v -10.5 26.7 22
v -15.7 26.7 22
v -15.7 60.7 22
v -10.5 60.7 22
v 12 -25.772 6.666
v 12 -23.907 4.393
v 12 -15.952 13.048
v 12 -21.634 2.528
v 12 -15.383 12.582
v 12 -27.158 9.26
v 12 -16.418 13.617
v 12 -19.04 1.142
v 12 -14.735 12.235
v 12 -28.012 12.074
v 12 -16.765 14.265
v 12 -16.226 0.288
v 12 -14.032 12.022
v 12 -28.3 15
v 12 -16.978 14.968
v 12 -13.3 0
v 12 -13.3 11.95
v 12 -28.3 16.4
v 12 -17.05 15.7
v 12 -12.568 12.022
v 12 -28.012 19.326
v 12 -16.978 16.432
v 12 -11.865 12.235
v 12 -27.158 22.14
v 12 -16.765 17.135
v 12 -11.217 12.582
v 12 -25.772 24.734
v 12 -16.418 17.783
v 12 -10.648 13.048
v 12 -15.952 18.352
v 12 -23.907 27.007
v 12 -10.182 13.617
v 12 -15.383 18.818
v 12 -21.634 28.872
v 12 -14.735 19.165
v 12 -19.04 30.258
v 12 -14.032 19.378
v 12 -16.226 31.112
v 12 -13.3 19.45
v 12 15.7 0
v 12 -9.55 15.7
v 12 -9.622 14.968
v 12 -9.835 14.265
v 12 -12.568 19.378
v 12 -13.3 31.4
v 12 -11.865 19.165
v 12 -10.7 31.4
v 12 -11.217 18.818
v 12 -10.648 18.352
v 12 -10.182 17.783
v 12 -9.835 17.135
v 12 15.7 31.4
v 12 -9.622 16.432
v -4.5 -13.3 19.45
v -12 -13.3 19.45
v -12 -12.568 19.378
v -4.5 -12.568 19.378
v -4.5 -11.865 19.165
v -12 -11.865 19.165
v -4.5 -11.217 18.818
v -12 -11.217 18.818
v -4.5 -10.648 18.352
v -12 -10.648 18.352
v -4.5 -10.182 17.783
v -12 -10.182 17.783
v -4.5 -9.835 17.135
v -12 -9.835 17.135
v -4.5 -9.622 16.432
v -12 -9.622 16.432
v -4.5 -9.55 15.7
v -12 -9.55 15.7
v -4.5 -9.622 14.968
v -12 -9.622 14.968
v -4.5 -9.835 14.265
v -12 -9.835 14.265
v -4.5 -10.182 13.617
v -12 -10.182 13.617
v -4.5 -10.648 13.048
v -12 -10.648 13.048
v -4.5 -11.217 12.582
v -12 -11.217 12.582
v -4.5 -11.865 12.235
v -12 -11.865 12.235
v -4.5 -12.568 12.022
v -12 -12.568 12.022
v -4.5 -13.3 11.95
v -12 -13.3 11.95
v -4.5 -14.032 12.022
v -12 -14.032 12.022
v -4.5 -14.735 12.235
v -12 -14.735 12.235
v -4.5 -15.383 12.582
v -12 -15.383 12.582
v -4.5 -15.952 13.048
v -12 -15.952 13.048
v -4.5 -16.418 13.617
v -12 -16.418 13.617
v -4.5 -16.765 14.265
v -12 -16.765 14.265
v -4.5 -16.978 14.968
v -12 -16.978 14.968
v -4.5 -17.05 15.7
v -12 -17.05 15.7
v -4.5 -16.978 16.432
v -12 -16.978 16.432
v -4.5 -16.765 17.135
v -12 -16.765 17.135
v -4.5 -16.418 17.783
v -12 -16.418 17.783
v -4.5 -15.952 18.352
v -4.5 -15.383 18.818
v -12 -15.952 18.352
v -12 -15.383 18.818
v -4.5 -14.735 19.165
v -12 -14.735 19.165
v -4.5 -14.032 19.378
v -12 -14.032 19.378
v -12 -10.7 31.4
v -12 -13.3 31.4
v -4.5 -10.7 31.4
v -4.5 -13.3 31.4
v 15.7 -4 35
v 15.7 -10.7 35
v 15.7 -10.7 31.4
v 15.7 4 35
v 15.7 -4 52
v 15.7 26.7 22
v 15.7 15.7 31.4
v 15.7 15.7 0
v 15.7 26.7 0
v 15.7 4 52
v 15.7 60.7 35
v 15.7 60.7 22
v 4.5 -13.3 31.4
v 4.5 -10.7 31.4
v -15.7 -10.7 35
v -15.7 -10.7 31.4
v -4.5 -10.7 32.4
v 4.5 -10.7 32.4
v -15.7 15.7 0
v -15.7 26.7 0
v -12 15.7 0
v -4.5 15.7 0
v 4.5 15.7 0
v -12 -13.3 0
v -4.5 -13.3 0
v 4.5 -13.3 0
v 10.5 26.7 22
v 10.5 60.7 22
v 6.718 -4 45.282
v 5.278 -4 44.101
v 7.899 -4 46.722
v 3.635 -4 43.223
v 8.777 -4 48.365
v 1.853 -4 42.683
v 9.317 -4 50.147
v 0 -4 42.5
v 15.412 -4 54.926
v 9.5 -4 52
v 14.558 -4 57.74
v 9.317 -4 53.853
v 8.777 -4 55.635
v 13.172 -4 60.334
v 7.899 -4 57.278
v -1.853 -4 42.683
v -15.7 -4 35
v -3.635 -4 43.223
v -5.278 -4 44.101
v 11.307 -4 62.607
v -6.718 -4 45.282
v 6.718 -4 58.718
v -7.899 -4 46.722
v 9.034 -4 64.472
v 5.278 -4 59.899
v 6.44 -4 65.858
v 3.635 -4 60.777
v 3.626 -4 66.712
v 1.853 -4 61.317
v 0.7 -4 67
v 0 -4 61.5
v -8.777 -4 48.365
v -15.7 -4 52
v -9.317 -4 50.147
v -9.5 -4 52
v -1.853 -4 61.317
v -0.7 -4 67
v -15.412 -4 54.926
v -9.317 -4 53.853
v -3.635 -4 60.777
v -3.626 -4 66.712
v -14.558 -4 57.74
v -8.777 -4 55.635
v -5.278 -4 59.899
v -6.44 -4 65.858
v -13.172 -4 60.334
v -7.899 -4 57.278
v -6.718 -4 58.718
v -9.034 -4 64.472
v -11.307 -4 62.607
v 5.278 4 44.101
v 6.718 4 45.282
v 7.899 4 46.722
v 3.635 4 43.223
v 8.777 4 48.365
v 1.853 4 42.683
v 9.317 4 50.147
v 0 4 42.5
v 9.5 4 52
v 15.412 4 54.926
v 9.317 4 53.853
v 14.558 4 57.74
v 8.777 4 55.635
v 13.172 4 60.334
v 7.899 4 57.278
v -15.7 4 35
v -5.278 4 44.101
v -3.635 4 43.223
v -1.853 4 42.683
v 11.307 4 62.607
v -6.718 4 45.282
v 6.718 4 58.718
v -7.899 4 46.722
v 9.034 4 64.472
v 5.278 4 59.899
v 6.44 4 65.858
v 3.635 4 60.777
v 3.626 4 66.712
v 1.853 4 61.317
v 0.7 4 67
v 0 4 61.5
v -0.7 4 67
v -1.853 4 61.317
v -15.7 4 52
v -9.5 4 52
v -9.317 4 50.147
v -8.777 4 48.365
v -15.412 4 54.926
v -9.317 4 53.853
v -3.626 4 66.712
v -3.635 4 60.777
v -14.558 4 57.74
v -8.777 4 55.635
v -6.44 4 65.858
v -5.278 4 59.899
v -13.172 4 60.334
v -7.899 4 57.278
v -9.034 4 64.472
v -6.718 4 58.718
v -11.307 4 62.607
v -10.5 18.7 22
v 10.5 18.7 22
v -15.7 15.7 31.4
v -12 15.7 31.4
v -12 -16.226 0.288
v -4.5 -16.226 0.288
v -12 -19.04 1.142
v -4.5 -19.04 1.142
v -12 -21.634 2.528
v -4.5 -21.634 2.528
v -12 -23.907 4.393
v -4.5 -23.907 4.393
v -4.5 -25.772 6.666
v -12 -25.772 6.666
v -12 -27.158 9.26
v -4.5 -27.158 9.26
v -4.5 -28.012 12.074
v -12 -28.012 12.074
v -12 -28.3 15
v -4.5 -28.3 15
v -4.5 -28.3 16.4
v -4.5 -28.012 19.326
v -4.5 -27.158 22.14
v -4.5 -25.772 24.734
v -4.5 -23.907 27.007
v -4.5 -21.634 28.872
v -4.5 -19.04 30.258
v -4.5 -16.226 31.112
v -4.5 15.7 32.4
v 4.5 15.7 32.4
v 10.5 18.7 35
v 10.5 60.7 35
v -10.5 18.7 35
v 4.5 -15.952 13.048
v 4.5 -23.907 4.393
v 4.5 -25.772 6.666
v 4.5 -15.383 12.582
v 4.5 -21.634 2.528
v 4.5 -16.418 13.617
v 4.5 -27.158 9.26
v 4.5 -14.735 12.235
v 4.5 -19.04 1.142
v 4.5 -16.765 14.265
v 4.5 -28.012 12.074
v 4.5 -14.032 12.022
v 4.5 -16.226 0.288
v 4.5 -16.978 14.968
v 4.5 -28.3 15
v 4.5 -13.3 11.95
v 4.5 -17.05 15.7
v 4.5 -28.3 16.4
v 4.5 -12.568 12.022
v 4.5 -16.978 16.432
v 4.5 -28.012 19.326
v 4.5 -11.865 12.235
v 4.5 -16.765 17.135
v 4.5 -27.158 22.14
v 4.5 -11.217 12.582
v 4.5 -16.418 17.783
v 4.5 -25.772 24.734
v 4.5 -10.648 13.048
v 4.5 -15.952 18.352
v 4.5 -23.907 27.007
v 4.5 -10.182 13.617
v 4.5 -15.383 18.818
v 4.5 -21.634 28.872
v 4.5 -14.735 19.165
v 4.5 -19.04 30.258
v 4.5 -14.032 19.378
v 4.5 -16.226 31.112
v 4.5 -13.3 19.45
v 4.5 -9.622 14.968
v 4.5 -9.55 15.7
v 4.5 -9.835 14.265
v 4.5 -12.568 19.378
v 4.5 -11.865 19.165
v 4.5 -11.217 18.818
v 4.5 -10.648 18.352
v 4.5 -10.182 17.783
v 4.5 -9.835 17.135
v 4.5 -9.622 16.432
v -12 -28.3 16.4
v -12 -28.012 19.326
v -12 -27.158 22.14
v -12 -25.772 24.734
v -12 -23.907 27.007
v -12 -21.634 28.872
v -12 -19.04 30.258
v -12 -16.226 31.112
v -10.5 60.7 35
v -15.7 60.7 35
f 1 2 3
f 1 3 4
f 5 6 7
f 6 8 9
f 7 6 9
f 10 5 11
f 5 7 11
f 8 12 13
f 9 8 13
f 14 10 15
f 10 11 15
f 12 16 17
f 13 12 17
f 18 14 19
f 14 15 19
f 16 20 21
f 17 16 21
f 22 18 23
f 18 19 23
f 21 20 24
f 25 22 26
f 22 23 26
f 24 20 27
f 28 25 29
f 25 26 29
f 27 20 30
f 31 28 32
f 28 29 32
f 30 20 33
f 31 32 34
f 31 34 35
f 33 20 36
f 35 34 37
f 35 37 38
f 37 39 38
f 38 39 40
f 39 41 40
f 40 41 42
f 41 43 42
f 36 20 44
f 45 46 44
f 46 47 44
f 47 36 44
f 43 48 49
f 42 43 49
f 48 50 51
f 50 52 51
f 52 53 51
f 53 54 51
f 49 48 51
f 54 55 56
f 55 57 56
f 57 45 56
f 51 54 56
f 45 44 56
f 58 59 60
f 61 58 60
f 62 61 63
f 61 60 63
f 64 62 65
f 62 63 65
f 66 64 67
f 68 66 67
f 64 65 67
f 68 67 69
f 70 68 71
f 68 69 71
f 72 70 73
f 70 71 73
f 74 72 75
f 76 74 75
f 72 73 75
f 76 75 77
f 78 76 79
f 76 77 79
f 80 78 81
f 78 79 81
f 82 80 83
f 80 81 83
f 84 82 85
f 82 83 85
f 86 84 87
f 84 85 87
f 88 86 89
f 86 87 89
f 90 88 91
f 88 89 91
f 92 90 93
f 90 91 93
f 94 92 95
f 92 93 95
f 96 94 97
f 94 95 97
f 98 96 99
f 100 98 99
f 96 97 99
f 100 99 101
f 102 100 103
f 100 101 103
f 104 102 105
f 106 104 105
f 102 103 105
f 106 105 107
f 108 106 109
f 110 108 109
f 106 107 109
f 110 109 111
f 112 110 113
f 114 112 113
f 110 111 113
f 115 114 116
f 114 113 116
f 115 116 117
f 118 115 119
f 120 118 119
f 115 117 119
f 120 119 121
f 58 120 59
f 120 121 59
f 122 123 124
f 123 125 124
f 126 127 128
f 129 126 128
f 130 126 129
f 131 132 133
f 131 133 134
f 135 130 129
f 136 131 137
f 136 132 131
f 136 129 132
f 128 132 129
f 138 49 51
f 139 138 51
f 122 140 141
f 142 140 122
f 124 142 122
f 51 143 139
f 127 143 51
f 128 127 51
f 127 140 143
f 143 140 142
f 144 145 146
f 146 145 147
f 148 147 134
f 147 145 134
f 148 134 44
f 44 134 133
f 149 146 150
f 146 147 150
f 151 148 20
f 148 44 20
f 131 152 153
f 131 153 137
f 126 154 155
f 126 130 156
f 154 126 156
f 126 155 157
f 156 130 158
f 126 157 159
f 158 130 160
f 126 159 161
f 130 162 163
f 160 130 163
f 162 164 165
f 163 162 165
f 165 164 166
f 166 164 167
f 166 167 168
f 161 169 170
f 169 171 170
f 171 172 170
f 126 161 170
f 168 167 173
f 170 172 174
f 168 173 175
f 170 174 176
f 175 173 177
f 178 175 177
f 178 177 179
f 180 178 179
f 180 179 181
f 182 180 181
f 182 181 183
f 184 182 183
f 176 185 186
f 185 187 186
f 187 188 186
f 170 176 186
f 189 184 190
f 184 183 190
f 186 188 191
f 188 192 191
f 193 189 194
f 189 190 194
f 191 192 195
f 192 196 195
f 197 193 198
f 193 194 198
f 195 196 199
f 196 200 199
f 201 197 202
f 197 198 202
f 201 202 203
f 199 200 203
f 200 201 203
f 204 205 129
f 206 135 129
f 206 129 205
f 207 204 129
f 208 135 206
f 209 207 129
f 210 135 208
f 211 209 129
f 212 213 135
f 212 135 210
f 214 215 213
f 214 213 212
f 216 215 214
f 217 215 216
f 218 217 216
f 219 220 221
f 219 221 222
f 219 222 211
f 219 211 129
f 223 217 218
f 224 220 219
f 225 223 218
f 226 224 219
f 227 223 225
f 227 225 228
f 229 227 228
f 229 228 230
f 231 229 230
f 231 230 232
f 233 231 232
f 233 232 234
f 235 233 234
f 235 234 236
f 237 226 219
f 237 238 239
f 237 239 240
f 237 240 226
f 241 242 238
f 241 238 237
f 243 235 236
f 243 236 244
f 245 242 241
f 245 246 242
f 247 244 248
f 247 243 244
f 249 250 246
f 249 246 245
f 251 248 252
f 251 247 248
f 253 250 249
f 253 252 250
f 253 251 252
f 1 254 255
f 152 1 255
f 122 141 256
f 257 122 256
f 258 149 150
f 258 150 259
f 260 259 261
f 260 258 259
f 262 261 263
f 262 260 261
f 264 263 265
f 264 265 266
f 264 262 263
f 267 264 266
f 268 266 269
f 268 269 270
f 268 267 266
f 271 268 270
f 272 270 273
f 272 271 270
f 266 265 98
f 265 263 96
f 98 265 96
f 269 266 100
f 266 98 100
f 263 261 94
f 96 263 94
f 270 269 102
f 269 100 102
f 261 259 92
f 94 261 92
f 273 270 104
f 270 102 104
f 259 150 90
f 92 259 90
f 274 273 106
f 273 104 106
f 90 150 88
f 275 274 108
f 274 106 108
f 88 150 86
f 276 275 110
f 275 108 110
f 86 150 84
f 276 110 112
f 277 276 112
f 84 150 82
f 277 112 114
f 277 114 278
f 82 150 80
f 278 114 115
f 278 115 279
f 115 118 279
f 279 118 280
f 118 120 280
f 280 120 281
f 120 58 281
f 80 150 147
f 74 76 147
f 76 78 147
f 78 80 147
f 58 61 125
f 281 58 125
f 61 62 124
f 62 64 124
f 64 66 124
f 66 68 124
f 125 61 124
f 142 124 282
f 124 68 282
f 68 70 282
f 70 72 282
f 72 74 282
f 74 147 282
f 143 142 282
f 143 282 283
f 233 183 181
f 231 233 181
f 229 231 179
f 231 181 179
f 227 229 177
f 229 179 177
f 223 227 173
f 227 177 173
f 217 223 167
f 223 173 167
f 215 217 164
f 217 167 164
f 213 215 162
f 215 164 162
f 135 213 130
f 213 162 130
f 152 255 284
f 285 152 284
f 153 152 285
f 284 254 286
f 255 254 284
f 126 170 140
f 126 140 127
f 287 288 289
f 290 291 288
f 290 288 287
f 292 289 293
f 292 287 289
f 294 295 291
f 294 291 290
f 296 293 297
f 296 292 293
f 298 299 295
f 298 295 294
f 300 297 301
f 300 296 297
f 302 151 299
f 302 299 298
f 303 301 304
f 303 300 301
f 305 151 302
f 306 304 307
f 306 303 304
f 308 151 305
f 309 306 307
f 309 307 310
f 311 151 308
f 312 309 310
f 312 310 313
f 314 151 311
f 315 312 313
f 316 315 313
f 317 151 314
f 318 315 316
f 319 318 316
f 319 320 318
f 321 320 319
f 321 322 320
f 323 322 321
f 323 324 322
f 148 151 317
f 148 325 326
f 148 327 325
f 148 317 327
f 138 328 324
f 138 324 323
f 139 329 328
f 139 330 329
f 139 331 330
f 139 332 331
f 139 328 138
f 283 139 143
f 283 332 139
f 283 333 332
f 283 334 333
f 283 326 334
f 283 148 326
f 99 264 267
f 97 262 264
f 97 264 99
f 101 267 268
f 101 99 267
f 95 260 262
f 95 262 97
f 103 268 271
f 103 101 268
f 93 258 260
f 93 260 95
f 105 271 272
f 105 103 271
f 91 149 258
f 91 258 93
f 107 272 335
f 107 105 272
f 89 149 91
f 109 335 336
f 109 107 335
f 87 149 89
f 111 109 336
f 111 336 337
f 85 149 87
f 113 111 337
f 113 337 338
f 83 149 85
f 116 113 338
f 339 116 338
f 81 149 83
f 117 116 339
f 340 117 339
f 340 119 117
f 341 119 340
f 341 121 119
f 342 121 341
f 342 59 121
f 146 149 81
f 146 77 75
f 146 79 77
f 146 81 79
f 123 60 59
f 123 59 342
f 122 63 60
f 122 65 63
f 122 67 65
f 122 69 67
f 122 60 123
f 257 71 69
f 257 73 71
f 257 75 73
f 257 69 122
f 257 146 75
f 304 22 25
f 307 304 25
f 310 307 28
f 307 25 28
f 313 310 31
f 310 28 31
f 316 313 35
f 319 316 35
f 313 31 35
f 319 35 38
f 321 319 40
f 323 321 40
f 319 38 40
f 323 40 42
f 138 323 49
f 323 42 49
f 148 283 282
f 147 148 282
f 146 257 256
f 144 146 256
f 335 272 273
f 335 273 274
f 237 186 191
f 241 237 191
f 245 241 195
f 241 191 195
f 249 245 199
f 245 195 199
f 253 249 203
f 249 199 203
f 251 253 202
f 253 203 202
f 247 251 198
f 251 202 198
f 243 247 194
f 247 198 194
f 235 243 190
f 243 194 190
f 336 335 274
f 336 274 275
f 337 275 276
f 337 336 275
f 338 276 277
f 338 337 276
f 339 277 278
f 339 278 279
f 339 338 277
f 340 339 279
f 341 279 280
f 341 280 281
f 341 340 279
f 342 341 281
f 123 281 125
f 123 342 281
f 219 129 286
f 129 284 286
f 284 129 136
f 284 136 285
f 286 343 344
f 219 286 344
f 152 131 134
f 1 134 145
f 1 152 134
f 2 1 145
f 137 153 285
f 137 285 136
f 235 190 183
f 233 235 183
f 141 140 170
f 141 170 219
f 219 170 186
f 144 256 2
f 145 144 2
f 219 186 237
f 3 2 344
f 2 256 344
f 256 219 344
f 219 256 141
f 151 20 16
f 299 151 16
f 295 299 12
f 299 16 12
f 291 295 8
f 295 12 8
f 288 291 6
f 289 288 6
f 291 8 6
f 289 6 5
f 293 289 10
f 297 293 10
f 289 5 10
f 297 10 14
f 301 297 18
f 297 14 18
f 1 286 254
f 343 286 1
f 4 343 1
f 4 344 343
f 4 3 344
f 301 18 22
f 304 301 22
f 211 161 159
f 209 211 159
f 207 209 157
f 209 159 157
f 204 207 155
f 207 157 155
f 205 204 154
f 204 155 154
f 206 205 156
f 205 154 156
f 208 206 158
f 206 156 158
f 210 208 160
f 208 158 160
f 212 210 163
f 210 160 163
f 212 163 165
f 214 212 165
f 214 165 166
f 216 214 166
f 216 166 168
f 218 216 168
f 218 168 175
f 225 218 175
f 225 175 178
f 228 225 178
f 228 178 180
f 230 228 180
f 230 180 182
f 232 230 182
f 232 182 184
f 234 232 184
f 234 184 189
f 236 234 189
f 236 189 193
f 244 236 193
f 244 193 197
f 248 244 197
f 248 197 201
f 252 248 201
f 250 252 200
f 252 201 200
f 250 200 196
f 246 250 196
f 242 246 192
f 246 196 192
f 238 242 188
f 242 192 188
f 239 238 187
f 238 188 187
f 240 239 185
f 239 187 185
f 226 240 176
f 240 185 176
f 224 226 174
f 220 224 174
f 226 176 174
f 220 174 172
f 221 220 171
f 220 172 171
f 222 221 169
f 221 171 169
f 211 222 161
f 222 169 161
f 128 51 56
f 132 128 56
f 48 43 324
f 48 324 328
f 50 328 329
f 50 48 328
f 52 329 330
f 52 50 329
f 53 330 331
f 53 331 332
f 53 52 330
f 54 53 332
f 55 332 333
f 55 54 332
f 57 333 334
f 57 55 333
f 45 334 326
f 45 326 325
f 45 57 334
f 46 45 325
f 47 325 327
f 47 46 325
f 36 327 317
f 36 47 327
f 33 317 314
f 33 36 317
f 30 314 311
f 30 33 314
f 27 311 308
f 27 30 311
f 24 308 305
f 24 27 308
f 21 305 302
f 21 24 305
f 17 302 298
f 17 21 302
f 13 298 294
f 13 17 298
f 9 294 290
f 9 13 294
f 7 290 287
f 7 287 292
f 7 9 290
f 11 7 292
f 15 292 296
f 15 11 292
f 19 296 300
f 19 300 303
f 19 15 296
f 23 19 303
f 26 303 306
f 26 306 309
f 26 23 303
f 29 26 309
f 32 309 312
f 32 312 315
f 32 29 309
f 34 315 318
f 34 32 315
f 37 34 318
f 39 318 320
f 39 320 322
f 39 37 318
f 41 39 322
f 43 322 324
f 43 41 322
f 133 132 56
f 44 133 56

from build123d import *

# Parameters (mm, degrees)
SKETCH4_W            = 31.4
SKETCH4_H            = 31.4
SKETCH4_W_2          = 25.4
SKETCH4_H_2          = 25.4
BOSS_EXTRUDE3_DEPTH  = 30
SKETCH5_W            = 31.4
SKETCH5_H            = 31.4
BOSS_EXTRUDE4_DEPTH  = 5
SKETCH6_W            = 31.4
SKETCH6_H            = 8
BOSS_EXTRUDE5_DEPTH  = 5
BOSS_EXTRUDE6_DEPTH  = 8
SKETCH8_R            = 9.5
BOSS_EXTRUDE7_DEPTH  = 8
SKETCH9_W            = 31.4
SKETCH9_H            = 10
BOSS_EXTRUDE8_DEPTH  = 5
SKETCH10_W           = 31.4
SKETCH10_H           = 10
BOSS_EXTRUDE9_DEPTH  = 11
SKETCH11_W           = 5.2
SKETCH11_H           = 10
BOSS_EXTRUDE10_DEPTH = 40
BOSS_EXTRUDE11_DEPTH = 3
SKETCH13_W           = 31.4
SKETCH13_H           = 31.4
CUT_EXTRUDE1_DEPTH   = 31.4
SKETCH15_W           = 31.4
SKETCH15_H           = 11
BOSS_EXTRUDE12_DEPTH = 12
SKETCH17_W           = 7.5
SKETCH17_H           = 31.4
BOSS_EXTRUDE13_DEPTH = 10
SKETCH18_R           = 3.75
BOSS_EXTRUDE14_DEPTH = 7.5
SKETCH19_W           = 3.6
SKETCH19_H           = 5
CUT_EXTRUDE2_DEPTH   = 31.4
CUT_EXTRUDE3_START   = 8
SKETCH8_2_R          = 9.5
CUT_EXTRUDE3_DEPTH   = 24
SKETCH20_W           = 9
SKETCH20_H           = 1
CUT_EXTRUDE4_DEPTH   = 26.4
SKETCH21_W           = 21
SKETCH21_H           = 13
CUT_EXTRUDE5_DEPTH   = 2


with BuildPart() as part:
    # Sketch4 → Boss-Extrude3 (new body)
    with BuildSketch(Plane.XY):
        Rectangle(SKETCH4_W, SKETCH4_H)
        Rectangle(SKETCH4_W_2, SKETCH4_H_2, mode=Mode.SUBTRACT)
    extrude(amount=BOSS_EXTRUDE3_DEPTH)

    # Sketch5 → Boss-Extrude4 (add)
    with BuildSketch(Plane.XY.offset(30)):
        Rectangle(SKETCH5_W, SKETCH5_H)
    extrude(amount=BOSS_EXTRUDE4_DEPTH)

    # Sketch6 → Boss-Extrude5 (add)
    with BuildSketch(Plane.XY.offset(35)):
        Rectangle(SKETCH6_W, SKETCH6_H)
    extrude(amount=BOSS_EXTRUDE5_DEPTH)

    # Sketch7 → Boss-Extrude6 (add)
    with BuildSketch(Plane.XZ.offset(4)):
        with BuildLine():
            Line((-15.7, 40), (-15.7, 52))
            ThreePointArc((-15.7, 52), (-11.306601718, 62.606601718), (-0.7, 67))
            Line((-0.7, 67), (0.7, 67))
            ThreePointArc((0.7, 67), (11.306601718, 62.606601718), (15.7, 52))
            Line((15.7, 52), (15.7, 40))
            Line((15.7, 40), (-15.7, 40))
        make_face()
    extrude(amount=-BOSS_EXTRUDE6_DEPTH)

    # Sketch8 → Boss-Extrude7 (add)
    with BuildSketch(Plane.XZ.offset(4)):
        with Locations((0, 52)):
            Circle(SKETCH8_R)
    boss_extrude7 = extrude(amount=BOSS_EXTRUDE7_DEPTH)

    # Mirror1: Boss-Extrude7 across plane
    add(boss_extrude7.mirror(Plane.ZX))

    # Sketch9 → Boss-Extrude8 (add)
    with BuildSketch(Plane(origin=(0, 15.7, 0), x_dir=(1, 0, 0), z_dir=(0, 1, 0))):
        with Locations((0, -27)):
            Rectangle(SKETCH9_W, SKETCH9_H)
    extrude(amount=BOSS_EXTRUDE8_DEPTH)

    # Sketch10 → Boss-Extrude9 (add)
    with BuildSketch(Plane(origin=(0, 15.7, 0), x_dir=(1, 0, 0), z_dir=(0, 1, 0))):
        with Locations((0, -17)):
            Rectangle(SKETCH10_W, SKETCH10_H)
    extrude(amount=BOSS_EXTRUDE9_DEPTH)

    # Sketch11 → Boss-Extrude10 (add)
    with BuildSketch(Plane(origin=(0, 20.7, 0), x_dir=(1, 0, 0), z_dir=(0, 1, 0))):
        with Locations((-13.1, -27)):
            Rectangle(SKETCH11_W, SKETCH11_H)
        with Locations((13.1, -27)):
            Rectangle(SKETCH11_W, SKETCH11_H)
    extrude(amount=BOSS_EXTRUDE10_DEPTH)

    # Sketch12 → Boss-Extrude11 (add)
    with BuildSketch(Plane.XY.offset(32)):
        Polygon((-15.7, 60.7), (-10.5, 60.7), (-10.5, 20.7), (10.5, 20.7), (10.5, 60.7), (15.7, 60.7), (15.7, 15.7), (-15.7, 15.7), align=None)
    extrude(amount=BOSS_EXTRUDE11_DEPTH)

    # Sketch13 → Cut-Extrude1 (cut)
    with BuildSketch(Plane.ZY.offset(15.7)):
        with Locations((15.7, 0)):
            Rectangle(SKETCH13_W, SKETCH13_H)
    extrude(amount=-CUT_EXTRUDE1_DEPTH, mode=Mode.SUBTRACT)

    # Sketch15 → Boss-Extrude12 (add)
    with BuildSketch(Plane(origin=(0, 0, 12), x_dir=(-1, 0, 0), z_dir=(0, 0, -1))):
        with Locations((0, 21.2)):
            Rectangle(SKETCH15_W, SKETCH15_H)
    extrude(amount=BOSS_EXTRUDE12_DEPTH)

    # Sketch17 → Boss-Extrude13 (add)
    with BuildSketch(Plane.XZ.offset(-15.7)):
        with Locations((-8.25, 15.7)):
            Rectangle(SKETCH17_W, SKETCH17_H)
    boss_extrude13 = extrude(amount=BOSS_EXTRUDE13_DEPTH)

    # Sketch18 → Boss-Extrude14 (add)
    with BuildSketch(Plane.ZY.offset(12)):
        with BuildLine():
            Line((31.4, 5.7), (0, 5.7))
            Line((0, 5.7), (0, -13.3))
            ThreePointArc((0, -13.3), (4.393398282, -23.906601718), (15, -28.3))
            Line((15, -28.3), (16.4, -28.3))
            ThreePointArc((16.4, -28.3), (27.006601718, -23.906601718), (31.4, -13.3))
            Line((31.4, -13.3), (31.4, 5.7))
        make_face()
        with Locations((15.7, -13.3)):
            Circle(SKETCH18_R, mode=Mode.SUBTRACT)
    boss_extrude14 = extrude(amount=-BOSS_EXTRUDE14_DEPTH)

    # Mirror3: Boss-Extrude13, Boss-Extrude14 across plane
    add(boss_extrude13.mirror(Plane(origin=(0, 0, 0), x_dir=(0, 0, 1), z_dir=(1, 0, 0))))
    add(boss_extrude14.mirror(Plane(origin=(0, 0, 0), x_dir=(0, 0, 1), z_dir=(1, 0, 0))))

    # Sketch19 → Cut-Extrude2 (cut)
    with BuildSketch(Plane(origin=(15.7, 0, 0), x_dir=(0, 0, -1), z_dir=(1, 0, 0))):
        with Locations((-33.2, -13.2)):
            Rectangle(SKETCH19_W, SKETCH19_H)
    extrude(amount=-CUT_EXTRUDE2_DEPTH, mode=Mode.SUBTRACT)

    # Sketch8<2> → Cut-Extrude3 (cut)
    with BuildSketch(Plane.XZ.offset(4).offset(CUT_EXTRUDE3_START)):
        with Locations((0, 52)):
            Circle(SKETCH8_2_R)
    extrude(amount=-CUT_EXTRUDE3_DEPTH, mode=Mode.SUBTRACT)

    # Sketch20 → Cut-Extrude4 (cut)
    with BuildSketch(Plane.XZ.offset(10.7)):
        with Locations((0, 31.9)):
            Rectangle(SKETCH20_W, SKETCH20_H)
    extrude(amount=-CUT_EXTRUDE4_DEPTH, mode=Mode.SUBTRACT)

    # Sketch21 → Cut-Extrude5 (cut)
    with BuildSketch(Plane(origin=(0, 20.7, 0), x_dir=(1, 0, 0), z_dir=(0, 1, 0))):
        with Locations((0, -28.5)):
            Rectangle(SKETCH21_W, SKETCH21_H)
    extrude(amount=-CUT_EXTRUDE5_DEPTH, mode=Mode.SUBTRACT)


solid = part.part
